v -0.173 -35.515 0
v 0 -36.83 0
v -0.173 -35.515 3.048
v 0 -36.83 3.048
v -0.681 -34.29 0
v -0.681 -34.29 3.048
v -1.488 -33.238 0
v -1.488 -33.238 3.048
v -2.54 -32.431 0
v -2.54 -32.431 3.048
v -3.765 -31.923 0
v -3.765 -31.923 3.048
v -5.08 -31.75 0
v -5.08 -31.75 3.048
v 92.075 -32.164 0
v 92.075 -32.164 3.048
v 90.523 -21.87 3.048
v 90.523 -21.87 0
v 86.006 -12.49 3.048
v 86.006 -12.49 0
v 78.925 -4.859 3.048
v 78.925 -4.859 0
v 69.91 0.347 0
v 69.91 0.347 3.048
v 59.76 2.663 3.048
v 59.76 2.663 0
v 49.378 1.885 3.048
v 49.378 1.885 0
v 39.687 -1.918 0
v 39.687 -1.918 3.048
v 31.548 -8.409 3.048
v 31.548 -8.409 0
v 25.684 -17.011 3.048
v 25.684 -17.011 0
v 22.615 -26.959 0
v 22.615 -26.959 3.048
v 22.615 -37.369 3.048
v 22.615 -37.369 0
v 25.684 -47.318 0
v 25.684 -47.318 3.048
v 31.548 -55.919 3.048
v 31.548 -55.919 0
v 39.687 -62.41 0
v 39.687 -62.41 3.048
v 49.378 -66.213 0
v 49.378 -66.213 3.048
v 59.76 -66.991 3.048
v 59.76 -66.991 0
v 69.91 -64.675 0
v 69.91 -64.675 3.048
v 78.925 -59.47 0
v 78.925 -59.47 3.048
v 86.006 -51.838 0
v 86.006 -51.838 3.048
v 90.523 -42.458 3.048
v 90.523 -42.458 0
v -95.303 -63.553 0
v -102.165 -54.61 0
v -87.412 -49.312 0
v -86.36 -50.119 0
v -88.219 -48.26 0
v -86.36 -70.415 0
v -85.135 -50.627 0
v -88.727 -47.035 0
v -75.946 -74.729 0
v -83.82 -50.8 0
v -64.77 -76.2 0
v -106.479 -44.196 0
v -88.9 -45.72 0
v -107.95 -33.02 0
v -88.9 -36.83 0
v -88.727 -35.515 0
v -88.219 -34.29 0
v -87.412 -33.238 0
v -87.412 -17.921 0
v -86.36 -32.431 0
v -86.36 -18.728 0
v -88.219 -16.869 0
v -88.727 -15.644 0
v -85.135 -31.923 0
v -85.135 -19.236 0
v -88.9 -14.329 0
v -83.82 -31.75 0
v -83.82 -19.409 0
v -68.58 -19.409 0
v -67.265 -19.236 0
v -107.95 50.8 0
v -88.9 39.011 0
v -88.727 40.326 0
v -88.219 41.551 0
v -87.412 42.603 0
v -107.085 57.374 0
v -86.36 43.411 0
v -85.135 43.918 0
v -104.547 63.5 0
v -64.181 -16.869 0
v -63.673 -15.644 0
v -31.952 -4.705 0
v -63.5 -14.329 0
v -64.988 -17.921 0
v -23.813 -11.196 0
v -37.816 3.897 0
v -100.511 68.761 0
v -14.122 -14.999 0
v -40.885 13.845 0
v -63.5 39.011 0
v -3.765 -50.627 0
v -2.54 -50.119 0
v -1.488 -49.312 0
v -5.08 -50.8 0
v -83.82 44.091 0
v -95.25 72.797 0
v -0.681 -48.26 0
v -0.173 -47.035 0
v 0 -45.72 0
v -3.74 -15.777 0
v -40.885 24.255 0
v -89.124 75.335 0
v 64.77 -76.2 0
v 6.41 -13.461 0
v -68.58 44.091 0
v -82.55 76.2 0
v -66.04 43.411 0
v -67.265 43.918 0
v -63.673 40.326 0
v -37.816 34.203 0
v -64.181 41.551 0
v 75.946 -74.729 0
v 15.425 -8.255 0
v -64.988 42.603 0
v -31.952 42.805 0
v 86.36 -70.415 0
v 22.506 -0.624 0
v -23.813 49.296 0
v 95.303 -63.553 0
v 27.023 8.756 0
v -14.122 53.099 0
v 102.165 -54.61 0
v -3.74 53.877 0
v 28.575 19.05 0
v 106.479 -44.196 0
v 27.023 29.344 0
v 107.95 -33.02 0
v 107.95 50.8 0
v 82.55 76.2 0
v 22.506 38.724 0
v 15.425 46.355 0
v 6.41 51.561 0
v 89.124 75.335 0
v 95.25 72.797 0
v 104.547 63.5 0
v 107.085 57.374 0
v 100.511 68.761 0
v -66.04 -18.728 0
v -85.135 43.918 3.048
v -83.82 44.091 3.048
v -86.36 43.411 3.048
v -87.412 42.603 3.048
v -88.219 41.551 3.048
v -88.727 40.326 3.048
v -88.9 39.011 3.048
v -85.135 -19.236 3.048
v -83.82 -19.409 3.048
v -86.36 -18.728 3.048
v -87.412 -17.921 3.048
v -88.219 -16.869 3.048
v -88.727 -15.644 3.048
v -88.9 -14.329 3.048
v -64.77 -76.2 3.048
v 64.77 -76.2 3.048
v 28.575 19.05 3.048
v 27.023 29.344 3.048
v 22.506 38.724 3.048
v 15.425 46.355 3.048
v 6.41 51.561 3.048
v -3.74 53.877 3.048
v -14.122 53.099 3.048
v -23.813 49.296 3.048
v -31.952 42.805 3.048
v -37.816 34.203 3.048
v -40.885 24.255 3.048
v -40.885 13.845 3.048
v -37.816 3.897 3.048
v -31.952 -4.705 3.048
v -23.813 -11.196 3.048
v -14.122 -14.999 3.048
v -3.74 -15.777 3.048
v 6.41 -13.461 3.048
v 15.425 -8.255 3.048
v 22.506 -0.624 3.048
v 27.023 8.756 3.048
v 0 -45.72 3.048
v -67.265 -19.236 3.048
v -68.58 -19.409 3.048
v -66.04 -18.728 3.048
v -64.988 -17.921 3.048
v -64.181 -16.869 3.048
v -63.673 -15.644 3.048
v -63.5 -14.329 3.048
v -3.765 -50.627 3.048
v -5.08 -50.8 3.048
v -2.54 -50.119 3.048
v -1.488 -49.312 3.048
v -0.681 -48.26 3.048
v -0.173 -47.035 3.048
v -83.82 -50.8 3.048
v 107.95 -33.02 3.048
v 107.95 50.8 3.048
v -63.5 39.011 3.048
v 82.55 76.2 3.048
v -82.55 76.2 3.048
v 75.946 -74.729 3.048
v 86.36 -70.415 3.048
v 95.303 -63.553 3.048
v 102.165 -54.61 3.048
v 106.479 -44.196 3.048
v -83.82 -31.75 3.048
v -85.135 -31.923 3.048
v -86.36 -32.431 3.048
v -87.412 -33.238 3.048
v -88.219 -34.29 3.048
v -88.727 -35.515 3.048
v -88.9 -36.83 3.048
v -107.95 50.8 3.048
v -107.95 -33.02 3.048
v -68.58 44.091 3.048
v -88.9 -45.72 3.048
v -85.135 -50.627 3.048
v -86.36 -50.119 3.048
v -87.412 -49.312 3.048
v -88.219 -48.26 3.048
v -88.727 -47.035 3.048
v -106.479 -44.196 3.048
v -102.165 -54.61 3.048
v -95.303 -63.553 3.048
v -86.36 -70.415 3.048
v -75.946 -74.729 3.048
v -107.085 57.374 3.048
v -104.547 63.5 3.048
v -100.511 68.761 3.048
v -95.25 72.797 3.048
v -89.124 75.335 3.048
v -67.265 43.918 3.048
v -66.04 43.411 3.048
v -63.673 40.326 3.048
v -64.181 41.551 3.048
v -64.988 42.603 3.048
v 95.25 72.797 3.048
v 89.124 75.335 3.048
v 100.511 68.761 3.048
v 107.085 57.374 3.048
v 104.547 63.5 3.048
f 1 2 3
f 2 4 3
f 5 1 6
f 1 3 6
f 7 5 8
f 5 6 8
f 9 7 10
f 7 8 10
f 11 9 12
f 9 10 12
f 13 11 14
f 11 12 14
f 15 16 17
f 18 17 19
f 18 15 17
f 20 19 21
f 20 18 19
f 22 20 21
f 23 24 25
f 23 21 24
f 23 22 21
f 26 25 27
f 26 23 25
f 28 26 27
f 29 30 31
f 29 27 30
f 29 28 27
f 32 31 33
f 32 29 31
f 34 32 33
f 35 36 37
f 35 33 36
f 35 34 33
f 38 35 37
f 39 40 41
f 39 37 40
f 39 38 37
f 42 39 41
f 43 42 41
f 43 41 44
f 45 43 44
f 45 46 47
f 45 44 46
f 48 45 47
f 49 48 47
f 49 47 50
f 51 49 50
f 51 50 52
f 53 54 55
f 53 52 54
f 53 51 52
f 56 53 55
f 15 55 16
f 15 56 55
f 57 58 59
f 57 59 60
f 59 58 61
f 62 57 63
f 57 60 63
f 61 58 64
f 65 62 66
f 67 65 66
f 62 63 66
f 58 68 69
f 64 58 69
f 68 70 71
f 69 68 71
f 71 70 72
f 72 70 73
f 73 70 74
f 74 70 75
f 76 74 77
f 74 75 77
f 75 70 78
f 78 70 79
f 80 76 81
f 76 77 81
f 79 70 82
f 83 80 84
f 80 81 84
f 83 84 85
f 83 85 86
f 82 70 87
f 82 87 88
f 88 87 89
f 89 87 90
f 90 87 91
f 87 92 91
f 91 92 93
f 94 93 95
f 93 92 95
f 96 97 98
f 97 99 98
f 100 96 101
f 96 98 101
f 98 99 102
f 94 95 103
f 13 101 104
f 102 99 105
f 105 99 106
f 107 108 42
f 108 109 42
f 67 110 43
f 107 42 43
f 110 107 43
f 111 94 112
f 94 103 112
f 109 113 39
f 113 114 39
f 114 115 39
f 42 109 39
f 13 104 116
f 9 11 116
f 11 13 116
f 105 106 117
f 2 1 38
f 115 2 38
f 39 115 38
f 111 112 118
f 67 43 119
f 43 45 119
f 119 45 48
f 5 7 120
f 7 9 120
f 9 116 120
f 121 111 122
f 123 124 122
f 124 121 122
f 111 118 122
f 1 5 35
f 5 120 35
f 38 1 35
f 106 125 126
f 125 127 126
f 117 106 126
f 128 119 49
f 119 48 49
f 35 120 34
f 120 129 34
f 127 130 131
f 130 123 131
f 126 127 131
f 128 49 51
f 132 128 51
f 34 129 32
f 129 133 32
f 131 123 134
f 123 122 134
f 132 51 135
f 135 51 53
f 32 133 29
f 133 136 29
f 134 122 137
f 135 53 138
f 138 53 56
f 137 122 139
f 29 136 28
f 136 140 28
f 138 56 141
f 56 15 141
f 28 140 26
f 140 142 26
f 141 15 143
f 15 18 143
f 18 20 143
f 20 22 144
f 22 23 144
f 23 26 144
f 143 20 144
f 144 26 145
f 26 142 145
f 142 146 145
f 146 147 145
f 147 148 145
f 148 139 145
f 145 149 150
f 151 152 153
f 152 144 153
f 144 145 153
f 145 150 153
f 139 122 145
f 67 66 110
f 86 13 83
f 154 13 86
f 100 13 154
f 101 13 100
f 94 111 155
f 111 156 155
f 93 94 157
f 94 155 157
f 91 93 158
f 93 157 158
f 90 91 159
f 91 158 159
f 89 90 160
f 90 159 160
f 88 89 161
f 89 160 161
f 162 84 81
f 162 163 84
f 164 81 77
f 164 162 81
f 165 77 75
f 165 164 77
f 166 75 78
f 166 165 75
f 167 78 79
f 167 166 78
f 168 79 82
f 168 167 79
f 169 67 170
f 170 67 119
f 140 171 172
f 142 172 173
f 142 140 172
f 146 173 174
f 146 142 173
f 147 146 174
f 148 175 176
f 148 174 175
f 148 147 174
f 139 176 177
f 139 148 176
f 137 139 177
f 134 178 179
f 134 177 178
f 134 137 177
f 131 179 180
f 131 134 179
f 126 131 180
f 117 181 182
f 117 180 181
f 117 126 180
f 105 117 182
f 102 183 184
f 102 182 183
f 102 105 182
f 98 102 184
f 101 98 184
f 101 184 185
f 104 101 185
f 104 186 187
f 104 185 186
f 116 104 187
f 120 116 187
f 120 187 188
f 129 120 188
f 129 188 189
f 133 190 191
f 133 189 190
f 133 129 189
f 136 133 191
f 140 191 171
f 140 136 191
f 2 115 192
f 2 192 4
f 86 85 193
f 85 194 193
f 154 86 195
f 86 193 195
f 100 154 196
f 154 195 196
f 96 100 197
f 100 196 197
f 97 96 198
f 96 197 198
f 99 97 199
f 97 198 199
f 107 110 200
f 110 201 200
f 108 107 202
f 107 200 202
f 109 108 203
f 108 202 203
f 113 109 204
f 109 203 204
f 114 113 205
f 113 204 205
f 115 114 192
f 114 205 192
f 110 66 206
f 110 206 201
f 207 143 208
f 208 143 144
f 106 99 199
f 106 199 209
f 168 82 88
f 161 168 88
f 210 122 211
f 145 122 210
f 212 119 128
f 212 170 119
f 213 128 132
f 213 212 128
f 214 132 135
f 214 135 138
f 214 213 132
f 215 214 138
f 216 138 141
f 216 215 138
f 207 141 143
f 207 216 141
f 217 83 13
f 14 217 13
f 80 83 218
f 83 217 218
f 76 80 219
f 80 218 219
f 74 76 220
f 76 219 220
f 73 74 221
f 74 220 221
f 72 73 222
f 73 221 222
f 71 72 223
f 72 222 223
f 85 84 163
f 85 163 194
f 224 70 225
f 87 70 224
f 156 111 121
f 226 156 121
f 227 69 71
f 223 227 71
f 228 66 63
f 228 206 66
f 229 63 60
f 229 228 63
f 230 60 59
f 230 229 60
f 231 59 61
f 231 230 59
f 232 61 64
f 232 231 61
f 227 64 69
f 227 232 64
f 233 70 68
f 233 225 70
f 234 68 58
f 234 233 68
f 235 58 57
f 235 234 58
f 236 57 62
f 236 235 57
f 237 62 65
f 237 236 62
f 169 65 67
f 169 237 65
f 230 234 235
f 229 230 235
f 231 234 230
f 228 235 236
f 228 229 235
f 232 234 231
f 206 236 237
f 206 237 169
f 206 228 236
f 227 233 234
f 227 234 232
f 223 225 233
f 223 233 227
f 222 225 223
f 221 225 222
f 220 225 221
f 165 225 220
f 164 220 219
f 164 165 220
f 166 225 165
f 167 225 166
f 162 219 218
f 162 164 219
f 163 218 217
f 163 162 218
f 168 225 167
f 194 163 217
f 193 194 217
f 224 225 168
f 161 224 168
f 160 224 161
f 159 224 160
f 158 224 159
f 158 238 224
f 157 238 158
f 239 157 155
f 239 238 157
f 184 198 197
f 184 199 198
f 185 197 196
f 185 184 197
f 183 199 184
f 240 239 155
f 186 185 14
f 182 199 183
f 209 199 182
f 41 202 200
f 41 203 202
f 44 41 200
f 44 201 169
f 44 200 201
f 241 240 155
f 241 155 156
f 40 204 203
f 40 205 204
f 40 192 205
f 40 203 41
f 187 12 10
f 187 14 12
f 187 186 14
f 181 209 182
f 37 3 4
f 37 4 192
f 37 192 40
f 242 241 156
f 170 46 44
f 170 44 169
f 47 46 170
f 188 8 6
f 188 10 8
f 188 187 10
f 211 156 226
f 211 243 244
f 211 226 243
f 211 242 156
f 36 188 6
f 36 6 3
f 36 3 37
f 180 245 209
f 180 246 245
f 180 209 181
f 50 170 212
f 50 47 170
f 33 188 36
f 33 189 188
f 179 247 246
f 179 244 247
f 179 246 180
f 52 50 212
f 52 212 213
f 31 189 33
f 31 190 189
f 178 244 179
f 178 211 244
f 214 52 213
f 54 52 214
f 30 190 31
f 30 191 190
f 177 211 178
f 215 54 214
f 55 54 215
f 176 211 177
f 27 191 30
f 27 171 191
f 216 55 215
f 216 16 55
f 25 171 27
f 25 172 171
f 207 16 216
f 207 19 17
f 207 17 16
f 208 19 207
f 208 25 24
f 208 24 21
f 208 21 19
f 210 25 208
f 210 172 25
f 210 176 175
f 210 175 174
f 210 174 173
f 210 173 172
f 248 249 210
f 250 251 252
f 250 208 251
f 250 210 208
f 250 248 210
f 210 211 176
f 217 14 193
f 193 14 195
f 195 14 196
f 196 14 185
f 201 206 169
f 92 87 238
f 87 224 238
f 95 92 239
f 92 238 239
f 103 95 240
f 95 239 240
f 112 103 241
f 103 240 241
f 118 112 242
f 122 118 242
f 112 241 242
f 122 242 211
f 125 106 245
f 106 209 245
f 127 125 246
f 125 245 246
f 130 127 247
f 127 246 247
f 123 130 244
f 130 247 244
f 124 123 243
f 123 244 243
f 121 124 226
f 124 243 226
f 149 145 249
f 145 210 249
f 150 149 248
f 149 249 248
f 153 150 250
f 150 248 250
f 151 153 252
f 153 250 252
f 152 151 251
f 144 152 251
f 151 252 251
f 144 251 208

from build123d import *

# Parameters (mm, degrees)
F0_W     = 215.9
F0_H     = 152.4
F1_DEPTH = 3.048
F2_W     = 25.4
F2_H     = 63.5
F2_R     = 34.925
F2_W_2   = 88.9
F2_H_2   = 19.05
F3_DEPTH = 25.4
F4_R     = 43.18
F5_R     = 5.08
F6_R     = 25.4


with BuildPart() as f1:
    # F0 (on Top) → F1 (new body)
    with BuildSketch(Plane.XY):
        Rectangle(F0_W, F0_H)
    extrude(amount=F1_DEPTH)

    # F2 (on Top) → F3 (cut)
    with BuildSketch(Plane.XY):
        with Locations((-76.2, 12.341094)):
            Rectangle(F2_W, F2_H)
        with Locations((-6.35, 19.05)):
            Circle(F2_R)
        with Locations((57.15, -32.164129)):
            Circle(F2_R)
        with Locations((-44.45, -41.275)):
            Rectangle(F2_W_2, F2_H_2)
    extrude(amount=F3_DEPTH, mode=Mode.SUBTRACT)

    # F4
    f4_edges = [f1.edges().sort_by_distance(p)[0] for p in [
        (-107.95, -76.2, 1.524),
        (107.95, -76.2, 1.524),
    ]]
    fillet(f4_edges, radius=F4_R)

    # F5
    f5_edges = [f1.edges().sort_by_distance(p)[0] for p in [
        (-88.9, 44.091094, 1.524),
        (-63.5, 44.091094, 1.524),
        (-88.9, -19.408906, 1.524),
        (-63.5, -19.408906, 1.524),
        (0, -50.8, 1.524),
        (0, -31.75, 1.524),
        (-88.9, -50.8, 1.524),
        (-88.9, -31.75, 1.524),
    ]]
    fillet(f5_edges, radius=F5_R)

    # F6
    f6_edges = [f1.edges().sort_by_distance(p)[0] for p in [
        (-107.95, 76.2, 1.524),
        (107.95, 76.2, 1.524),
    ]]
    fillet(f6_edges, radius=F6_R)


solid = f1.part
